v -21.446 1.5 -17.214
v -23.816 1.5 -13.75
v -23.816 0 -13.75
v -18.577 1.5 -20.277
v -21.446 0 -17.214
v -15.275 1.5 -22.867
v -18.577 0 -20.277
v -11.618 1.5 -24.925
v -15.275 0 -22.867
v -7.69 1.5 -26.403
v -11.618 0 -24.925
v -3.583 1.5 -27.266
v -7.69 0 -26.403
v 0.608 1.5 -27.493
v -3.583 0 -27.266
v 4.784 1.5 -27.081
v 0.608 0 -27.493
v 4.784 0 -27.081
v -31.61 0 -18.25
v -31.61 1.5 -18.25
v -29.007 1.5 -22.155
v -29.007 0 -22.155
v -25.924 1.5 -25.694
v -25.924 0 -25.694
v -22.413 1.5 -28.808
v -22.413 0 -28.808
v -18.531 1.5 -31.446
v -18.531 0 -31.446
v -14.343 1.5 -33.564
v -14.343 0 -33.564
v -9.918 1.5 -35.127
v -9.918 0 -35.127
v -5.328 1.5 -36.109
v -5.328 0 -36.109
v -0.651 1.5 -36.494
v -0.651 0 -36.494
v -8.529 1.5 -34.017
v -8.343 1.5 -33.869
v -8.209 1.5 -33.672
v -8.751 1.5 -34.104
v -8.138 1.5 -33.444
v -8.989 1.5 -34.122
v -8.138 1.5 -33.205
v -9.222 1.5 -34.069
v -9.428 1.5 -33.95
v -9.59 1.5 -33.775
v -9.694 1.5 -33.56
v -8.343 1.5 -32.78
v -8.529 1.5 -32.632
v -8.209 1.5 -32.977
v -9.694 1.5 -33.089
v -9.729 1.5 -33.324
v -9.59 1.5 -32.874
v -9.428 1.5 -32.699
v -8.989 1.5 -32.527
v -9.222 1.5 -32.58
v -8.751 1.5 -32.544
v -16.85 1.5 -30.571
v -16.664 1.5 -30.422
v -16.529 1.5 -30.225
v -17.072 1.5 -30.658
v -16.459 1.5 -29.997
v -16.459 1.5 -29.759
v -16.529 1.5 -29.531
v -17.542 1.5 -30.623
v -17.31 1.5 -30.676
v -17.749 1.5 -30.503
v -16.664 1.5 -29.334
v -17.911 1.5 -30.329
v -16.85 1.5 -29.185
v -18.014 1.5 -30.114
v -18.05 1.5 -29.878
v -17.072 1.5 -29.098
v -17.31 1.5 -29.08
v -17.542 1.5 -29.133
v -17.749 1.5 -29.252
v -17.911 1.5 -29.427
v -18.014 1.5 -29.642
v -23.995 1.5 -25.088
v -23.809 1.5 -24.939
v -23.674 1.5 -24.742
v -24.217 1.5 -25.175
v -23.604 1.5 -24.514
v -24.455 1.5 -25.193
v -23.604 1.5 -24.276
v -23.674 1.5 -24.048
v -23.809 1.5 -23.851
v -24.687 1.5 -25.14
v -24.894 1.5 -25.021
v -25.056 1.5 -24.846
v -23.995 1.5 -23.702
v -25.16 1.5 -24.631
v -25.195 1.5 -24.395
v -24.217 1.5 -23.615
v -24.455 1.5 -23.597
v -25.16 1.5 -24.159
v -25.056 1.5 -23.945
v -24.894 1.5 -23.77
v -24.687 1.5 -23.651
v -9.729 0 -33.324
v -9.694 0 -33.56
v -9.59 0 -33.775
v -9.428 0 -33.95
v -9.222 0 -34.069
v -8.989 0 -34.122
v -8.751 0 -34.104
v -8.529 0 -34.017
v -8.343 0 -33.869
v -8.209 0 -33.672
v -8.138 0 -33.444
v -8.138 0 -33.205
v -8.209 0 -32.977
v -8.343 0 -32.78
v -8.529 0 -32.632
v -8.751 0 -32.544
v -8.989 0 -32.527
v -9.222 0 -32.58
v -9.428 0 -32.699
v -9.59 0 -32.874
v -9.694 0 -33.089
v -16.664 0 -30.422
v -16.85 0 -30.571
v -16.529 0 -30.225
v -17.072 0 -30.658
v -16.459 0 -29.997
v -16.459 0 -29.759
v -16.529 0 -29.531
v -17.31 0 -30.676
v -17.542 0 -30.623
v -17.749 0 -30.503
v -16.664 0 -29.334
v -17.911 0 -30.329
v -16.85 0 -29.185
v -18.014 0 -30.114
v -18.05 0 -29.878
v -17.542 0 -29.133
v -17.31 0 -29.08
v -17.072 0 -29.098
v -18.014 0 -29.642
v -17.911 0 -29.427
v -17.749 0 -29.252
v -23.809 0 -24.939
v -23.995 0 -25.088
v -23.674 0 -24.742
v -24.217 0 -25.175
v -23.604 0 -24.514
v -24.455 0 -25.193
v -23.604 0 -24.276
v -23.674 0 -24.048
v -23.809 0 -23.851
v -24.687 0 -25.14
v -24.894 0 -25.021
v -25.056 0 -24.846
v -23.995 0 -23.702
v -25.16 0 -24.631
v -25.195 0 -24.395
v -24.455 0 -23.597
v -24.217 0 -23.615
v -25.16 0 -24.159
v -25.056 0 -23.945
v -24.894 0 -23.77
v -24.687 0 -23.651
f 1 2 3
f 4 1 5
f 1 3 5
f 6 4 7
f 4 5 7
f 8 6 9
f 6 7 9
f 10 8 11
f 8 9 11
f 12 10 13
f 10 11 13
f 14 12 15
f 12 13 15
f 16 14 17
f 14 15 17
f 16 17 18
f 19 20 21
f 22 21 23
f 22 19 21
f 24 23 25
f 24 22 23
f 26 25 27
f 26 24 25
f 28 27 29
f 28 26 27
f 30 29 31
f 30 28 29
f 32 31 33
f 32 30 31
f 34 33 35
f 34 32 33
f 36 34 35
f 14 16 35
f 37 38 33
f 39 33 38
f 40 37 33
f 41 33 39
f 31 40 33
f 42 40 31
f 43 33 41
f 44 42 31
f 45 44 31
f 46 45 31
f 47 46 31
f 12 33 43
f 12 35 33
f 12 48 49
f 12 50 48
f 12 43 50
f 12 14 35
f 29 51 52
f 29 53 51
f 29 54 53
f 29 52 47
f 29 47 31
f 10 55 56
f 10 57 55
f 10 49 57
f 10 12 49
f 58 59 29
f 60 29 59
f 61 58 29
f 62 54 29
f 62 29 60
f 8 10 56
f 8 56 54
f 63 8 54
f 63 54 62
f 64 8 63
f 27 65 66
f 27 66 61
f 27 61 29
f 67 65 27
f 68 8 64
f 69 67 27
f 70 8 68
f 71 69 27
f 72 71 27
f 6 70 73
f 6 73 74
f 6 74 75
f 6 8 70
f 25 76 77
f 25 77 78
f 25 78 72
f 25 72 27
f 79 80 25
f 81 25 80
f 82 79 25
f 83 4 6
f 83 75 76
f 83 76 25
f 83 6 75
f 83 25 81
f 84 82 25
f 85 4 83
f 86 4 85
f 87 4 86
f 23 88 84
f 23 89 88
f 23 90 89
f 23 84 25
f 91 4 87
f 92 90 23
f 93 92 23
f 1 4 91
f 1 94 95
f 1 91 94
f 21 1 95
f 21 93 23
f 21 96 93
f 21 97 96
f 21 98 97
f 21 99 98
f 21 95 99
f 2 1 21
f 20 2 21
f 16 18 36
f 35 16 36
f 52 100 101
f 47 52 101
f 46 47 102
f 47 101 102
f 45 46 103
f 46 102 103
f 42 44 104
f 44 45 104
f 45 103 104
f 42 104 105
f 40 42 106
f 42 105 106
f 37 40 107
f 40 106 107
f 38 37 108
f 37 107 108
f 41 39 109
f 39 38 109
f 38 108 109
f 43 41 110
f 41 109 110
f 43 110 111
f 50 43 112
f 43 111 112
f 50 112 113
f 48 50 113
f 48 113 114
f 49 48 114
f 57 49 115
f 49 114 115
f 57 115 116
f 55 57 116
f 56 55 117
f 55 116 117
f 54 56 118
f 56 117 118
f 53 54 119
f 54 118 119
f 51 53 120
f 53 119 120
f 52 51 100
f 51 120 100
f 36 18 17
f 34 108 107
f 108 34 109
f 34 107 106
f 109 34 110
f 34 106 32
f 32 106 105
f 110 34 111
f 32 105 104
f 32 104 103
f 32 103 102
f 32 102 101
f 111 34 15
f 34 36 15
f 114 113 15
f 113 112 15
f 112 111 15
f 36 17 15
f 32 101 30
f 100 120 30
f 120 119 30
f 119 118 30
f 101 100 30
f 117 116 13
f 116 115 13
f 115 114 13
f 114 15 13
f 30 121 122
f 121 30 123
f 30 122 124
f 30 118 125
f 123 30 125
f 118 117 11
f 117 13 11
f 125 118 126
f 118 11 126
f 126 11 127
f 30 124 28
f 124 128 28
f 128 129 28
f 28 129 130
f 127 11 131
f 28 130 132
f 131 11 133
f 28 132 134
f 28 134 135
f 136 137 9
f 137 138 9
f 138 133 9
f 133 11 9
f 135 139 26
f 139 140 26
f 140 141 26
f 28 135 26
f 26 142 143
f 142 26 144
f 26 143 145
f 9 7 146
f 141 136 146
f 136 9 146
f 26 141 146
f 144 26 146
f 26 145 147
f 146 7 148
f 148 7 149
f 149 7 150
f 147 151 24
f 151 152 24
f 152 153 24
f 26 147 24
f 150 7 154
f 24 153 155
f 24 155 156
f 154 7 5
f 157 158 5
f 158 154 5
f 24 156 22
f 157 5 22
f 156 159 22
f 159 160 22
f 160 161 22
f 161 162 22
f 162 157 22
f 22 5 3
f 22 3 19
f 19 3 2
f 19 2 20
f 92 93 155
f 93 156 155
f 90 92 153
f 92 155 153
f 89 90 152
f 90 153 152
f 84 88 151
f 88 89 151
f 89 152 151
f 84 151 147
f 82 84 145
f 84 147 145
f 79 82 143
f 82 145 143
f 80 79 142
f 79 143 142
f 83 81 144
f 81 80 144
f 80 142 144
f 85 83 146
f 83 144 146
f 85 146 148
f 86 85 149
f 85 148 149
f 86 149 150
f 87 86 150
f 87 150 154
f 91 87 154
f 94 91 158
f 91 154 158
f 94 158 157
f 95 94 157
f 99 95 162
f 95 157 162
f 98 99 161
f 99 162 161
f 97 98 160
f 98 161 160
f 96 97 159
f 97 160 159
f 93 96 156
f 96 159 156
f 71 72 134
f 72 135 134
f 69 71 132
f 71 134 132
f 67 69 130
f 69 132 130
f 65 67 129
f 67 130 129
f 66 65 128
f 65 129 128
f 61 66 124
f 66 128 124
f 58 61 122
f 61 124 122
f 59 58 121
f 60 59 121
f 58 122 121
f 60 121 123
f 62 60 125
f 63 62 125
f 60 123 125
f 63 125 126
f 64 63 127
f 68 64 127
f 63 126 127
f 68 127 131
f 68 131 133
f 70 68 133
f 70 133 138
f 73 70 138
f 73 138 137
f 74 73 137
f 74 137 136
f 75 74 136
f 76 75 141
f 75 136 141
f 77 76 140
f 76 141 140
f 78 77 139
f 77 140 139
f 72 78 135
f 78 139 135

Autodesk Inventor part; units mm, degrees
ref_plane "YZ Plane" through (0, 0, 0) normal (1, 0, 0) x (0, 1, 0)
ref_plane "XZ Plane" through (0, 0, 0) normal (0, 1, 0) x (-1, 0, 0)
ref_plane "XY Plane" through (0, 0, 0) normal (0, 0, 1) x (1, 0, 0)
sketch "スケッチ1" plane through (0, 0, 0) normal (0, 1, 0) x (-1, 0, 0)
  circle A0 centre (0, 0) radius 27.5
  line L0 (13, 12.85) -> (-13, 12.85)
  line L1 (-13, 12.85) -> (-13, -12.85)
  line L2 (-13, -12.85) -> (13, -12.85)
  line L3 (13, -12.85) -> (13, 12.85)
  circle A1 centre (0, 0) radius 32.5 construction
  circle A2 centre (0, 0) radius 36.5
  line L4 (0, 0) -> (18.4986, -32.0406)
  line L5 (0, 0) -> (31.6099, -18.25)
  line L6 (-13, -12.85) -> (0.651, -36.4942)
  line L7 (13.2, 12.8507) -> (13.2, -12.85)
  line L8 (13.2, -12.85) -> (13, -12.85)
  circle A3 centre (0, 0) radius 34.5 construction
  circle A4 centre (24.3952, -24.3952) radius 0.8
  circle A5 centre (8.9293, -33.3244) radius 0.8
  circle A6 centre (17.25, -29.8779) radius 0.8
  line L9 (0, 0) -> (24.3952, -24.3952) construction
  line L10 (0, 0) -> (8.9293, -33.3244) construction
  point P0 (13, 0)
  point P1 (0, 12.85)
  point P2 (13, -34.1065)
  point P3 (-13, -34.1065)
  point P4 (28.1458, -16.25)
  point P5 (13, -7.5056)
  point P6 (18.25, -31.6099)
  point P7 (16.25, -28.1458)
  point P8 (23.8157, -13.75)
  point P9 (-4.7839, -27.0807)
  point P10 (-1.6802, -32.4565)
  point P11 (13.2, -7.621)
  dimension "d0" = 55
  dimension "d1" = 12.85
  dimension "d2" = 26
  dimension "d3" = 5
  dimension "d4" = 4
  dimension "d11" = 60
  dimension "d12" = 30
  dimension "d16" = 0.2
  dimension "d19" = 2
  dimension "d20" = 1.6
  dimension "d21" = 1.6
  dimension "d22" = 1.6
  dimension "d23" = 15
  dimension "d24" = 15
extrude "押し出し4" add sketch "スケッチ1" along normal blind 1.5 contours A0 L4 A6 A2 L6 | L5 A2 L4 A6 A0
equation "\"d23\" = 0.5 * d12"
equation "\"d24\" = d23"
properties part number "waist_side_cover"
